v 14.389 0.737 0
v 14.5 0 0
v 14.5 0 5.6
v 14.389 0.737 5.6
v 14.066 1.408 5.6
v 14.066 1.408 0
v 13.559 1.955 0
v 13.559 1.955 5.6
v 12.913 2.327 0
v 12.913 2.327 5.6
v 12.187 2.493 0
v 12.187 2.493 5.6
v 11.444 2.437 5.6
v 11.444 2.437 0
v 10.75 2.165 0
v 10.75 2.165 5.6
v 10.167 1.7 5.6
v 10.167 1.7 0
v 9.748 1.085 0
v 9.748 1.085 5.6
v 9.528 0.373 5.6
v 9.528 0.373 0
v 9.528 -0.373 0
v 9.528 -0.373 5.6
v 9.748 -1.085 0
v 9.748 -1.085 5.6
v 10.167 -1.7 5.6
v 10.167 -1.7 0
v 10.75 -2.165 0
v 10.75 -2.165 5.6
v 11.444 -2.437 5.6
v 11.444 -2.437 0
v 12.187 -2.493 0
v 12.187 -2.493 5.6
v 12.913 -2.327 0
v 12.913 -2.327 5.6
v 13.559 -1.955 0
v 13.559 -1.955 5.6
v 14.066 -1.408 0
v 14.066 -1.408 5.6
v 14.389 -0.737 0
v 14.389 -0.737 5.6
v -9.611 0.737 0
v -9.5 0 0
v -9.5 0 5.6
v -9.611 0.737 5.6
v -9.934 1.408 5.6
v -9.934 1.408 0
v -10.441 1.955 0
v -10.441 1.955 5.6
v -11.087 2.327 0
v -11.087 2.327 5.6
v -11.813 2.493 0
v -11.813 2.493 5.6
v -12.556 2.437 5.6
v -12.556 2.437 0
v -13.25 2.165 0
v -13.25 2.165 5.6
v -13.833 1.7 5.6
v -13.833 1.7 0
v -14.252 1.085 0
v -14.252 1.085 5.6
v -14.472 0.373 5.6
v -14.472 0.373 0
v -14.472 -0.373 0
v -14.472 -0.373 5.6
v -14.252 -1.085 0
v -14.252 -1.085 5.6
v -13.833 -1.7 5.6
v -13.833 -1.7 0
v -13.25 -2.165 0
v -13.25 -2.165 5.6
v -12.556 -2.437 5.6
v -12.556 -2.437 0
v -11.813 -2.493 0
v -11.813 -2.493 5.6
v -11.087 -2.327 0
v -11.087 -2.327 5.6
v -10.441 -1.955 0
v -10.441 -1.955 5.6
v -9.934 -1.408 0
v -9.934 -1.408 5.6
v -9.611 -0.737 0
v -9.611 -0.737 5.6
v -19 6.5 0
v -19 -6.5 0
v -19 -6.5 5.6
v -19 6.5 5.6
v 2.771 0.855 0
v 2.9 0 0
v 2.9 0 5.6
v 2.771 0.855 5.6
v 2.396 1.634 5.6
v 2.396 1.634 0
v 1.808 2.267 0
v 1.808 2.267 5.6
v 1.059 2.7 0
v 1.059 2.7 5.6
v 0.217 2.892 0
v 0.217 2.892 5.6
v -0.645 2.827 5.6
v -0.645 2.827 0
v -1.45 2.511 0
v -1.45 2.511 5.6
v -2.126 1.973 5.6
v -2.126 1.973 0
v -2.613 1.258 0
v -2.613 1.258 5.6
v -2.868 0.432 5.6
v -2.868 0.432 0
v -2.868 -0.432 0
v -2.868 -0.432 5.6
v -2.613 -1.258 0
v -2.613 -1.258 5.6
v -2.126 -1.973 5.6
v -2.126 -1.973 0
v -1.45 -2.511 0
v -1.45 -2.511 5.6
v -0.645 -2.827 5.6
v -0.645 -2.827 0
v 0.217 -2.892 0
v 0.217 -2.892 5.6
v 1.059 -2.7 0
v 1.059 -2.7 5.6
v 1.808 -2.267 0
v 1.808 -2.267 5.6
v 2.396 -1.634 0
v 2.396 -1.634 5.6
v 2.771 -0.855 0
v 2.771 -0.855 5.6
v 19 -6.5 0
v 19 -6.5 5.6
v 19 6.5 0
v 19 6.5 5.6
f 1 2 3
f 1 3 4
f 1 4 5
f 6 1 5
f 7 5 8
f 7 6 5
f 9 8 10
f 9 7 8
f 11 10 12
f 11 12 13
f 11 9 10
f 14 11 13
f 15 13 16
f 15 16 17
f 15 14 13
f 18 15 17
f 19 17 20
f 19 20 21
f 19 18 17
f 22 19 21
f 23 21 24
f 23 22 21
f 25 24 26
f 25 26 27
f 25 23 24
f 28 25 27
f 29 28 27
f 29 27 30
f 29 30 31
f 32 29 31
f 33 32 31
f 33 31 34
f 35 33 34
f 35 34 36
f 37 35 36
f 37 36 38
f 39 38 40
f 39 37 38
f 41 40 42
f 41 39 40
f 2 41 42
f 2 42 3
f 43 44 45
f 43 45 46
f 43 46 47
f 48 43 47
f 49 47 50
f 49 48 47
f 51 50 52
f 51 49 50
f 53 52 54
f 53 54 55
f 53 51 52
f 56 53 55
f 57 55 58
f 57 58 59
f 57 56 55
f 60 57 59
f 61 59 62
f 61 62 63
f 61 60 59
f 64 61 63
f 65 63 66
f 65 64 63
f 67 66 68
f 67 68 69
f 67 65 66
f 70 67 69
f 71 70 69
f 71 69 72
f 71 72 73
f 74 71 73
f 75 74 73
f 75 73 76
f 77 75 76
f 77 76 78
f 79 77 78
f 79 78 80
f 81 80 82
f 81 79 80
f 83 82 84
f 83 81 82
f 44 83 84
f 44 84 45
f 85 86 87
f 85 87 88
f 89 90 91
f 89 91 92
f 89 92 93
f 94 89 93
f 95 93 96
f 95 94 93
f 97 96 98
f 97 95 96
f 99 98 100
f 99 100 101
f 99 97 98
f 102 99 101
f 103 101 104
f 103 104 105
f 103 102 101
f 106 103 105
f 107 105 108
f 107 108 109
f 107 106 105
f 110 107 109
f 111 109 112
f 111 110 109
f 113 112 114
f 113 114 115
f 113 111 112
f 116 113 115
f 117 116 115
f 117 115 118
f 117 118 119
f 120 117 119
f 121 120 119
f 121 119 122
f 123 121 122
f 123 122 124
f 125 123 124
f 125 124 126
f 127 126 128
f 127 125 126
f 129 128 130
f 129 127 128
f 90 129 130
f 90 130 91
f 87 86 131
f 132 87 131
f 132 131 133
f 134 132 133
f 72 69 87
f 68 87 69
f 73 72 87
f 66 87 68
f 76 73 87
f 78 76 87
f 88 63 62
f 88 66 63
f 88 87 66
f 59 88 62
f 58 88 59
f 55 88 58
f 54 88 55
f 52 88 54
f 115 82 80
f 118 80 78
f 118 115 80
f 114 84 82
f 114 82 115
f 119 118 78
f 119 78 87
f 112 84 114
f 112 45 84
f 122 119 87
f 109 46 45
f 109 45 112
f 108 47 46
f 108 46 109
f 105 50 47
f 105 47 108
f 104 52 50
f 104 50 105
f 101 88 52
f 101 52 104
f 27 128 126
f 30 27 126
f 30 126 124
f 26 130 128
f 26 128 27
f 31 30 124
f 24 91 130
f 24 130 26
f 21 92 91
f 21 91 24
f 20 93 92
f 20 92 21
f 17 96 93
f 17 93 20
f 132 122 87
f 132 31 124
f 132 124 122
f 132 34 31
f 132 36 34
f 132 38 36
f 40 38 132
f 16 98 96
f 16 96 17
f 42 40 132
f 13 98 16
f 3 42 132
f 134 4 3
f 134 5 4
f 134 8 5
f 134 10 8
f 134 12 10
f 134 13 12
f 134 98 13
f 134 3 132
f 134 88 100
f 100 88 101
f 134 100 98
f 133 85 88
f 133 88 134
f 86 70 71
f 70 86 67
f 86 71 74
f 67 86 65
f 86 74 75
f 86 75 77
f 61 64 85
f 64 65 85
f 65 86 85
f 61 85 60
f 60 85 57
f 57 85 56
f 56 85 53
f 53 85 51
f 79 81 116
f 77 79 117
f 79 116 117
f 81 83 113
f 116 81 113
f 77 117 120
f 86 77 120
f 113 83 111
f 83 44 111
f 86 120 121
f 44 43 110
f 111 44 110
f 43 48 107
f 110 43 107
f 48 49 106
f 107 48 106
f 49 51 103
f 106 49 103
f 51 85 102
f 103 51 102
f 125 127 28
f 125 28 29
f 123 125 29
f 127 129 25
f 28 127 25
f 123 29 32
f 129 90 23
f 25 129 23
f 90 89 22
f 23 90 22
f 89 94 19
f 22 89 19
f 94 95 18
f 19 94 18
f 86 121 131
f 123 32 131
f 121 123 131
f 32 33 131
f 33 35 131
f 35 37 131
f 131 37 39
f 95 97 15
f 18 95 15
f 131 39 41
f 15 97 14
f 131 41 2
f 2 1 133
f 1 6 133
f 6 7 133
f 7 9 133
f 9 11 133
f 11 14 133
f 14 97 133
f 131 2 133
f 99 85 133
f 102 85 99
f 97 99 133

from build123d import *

# Parameters (mm, degrees)
SKETCH1_W           = 38
SKETCH1_H           = 13
SKETCH1_R           = 2.9
SKETCH1_R_2         = 2.5
BOSS_EXTRUDE1_DEPTH = 5.6


with BuildPart() as part:
    # Sketch1 → Boss-Extrude1 (new body)
    with BuildSketch(Plane.XY):
        Rectangle(SKETCH1_W, SKETCH1_H)
        Circle(SKETCH1_R, mode=Mode.SUBTRACT)
        with Locations((-12, 0)):
            Circle(SKETCH1_R_2, mode=Mode.SUBTRACT)
        with Locations((12, 0)):
            Circle(SKETCH1_R_2, mode=Mode.SUBTRACT)
    extrude(amount=BOSS_EXTRUDE1_DEPTH)


solid = part.part
